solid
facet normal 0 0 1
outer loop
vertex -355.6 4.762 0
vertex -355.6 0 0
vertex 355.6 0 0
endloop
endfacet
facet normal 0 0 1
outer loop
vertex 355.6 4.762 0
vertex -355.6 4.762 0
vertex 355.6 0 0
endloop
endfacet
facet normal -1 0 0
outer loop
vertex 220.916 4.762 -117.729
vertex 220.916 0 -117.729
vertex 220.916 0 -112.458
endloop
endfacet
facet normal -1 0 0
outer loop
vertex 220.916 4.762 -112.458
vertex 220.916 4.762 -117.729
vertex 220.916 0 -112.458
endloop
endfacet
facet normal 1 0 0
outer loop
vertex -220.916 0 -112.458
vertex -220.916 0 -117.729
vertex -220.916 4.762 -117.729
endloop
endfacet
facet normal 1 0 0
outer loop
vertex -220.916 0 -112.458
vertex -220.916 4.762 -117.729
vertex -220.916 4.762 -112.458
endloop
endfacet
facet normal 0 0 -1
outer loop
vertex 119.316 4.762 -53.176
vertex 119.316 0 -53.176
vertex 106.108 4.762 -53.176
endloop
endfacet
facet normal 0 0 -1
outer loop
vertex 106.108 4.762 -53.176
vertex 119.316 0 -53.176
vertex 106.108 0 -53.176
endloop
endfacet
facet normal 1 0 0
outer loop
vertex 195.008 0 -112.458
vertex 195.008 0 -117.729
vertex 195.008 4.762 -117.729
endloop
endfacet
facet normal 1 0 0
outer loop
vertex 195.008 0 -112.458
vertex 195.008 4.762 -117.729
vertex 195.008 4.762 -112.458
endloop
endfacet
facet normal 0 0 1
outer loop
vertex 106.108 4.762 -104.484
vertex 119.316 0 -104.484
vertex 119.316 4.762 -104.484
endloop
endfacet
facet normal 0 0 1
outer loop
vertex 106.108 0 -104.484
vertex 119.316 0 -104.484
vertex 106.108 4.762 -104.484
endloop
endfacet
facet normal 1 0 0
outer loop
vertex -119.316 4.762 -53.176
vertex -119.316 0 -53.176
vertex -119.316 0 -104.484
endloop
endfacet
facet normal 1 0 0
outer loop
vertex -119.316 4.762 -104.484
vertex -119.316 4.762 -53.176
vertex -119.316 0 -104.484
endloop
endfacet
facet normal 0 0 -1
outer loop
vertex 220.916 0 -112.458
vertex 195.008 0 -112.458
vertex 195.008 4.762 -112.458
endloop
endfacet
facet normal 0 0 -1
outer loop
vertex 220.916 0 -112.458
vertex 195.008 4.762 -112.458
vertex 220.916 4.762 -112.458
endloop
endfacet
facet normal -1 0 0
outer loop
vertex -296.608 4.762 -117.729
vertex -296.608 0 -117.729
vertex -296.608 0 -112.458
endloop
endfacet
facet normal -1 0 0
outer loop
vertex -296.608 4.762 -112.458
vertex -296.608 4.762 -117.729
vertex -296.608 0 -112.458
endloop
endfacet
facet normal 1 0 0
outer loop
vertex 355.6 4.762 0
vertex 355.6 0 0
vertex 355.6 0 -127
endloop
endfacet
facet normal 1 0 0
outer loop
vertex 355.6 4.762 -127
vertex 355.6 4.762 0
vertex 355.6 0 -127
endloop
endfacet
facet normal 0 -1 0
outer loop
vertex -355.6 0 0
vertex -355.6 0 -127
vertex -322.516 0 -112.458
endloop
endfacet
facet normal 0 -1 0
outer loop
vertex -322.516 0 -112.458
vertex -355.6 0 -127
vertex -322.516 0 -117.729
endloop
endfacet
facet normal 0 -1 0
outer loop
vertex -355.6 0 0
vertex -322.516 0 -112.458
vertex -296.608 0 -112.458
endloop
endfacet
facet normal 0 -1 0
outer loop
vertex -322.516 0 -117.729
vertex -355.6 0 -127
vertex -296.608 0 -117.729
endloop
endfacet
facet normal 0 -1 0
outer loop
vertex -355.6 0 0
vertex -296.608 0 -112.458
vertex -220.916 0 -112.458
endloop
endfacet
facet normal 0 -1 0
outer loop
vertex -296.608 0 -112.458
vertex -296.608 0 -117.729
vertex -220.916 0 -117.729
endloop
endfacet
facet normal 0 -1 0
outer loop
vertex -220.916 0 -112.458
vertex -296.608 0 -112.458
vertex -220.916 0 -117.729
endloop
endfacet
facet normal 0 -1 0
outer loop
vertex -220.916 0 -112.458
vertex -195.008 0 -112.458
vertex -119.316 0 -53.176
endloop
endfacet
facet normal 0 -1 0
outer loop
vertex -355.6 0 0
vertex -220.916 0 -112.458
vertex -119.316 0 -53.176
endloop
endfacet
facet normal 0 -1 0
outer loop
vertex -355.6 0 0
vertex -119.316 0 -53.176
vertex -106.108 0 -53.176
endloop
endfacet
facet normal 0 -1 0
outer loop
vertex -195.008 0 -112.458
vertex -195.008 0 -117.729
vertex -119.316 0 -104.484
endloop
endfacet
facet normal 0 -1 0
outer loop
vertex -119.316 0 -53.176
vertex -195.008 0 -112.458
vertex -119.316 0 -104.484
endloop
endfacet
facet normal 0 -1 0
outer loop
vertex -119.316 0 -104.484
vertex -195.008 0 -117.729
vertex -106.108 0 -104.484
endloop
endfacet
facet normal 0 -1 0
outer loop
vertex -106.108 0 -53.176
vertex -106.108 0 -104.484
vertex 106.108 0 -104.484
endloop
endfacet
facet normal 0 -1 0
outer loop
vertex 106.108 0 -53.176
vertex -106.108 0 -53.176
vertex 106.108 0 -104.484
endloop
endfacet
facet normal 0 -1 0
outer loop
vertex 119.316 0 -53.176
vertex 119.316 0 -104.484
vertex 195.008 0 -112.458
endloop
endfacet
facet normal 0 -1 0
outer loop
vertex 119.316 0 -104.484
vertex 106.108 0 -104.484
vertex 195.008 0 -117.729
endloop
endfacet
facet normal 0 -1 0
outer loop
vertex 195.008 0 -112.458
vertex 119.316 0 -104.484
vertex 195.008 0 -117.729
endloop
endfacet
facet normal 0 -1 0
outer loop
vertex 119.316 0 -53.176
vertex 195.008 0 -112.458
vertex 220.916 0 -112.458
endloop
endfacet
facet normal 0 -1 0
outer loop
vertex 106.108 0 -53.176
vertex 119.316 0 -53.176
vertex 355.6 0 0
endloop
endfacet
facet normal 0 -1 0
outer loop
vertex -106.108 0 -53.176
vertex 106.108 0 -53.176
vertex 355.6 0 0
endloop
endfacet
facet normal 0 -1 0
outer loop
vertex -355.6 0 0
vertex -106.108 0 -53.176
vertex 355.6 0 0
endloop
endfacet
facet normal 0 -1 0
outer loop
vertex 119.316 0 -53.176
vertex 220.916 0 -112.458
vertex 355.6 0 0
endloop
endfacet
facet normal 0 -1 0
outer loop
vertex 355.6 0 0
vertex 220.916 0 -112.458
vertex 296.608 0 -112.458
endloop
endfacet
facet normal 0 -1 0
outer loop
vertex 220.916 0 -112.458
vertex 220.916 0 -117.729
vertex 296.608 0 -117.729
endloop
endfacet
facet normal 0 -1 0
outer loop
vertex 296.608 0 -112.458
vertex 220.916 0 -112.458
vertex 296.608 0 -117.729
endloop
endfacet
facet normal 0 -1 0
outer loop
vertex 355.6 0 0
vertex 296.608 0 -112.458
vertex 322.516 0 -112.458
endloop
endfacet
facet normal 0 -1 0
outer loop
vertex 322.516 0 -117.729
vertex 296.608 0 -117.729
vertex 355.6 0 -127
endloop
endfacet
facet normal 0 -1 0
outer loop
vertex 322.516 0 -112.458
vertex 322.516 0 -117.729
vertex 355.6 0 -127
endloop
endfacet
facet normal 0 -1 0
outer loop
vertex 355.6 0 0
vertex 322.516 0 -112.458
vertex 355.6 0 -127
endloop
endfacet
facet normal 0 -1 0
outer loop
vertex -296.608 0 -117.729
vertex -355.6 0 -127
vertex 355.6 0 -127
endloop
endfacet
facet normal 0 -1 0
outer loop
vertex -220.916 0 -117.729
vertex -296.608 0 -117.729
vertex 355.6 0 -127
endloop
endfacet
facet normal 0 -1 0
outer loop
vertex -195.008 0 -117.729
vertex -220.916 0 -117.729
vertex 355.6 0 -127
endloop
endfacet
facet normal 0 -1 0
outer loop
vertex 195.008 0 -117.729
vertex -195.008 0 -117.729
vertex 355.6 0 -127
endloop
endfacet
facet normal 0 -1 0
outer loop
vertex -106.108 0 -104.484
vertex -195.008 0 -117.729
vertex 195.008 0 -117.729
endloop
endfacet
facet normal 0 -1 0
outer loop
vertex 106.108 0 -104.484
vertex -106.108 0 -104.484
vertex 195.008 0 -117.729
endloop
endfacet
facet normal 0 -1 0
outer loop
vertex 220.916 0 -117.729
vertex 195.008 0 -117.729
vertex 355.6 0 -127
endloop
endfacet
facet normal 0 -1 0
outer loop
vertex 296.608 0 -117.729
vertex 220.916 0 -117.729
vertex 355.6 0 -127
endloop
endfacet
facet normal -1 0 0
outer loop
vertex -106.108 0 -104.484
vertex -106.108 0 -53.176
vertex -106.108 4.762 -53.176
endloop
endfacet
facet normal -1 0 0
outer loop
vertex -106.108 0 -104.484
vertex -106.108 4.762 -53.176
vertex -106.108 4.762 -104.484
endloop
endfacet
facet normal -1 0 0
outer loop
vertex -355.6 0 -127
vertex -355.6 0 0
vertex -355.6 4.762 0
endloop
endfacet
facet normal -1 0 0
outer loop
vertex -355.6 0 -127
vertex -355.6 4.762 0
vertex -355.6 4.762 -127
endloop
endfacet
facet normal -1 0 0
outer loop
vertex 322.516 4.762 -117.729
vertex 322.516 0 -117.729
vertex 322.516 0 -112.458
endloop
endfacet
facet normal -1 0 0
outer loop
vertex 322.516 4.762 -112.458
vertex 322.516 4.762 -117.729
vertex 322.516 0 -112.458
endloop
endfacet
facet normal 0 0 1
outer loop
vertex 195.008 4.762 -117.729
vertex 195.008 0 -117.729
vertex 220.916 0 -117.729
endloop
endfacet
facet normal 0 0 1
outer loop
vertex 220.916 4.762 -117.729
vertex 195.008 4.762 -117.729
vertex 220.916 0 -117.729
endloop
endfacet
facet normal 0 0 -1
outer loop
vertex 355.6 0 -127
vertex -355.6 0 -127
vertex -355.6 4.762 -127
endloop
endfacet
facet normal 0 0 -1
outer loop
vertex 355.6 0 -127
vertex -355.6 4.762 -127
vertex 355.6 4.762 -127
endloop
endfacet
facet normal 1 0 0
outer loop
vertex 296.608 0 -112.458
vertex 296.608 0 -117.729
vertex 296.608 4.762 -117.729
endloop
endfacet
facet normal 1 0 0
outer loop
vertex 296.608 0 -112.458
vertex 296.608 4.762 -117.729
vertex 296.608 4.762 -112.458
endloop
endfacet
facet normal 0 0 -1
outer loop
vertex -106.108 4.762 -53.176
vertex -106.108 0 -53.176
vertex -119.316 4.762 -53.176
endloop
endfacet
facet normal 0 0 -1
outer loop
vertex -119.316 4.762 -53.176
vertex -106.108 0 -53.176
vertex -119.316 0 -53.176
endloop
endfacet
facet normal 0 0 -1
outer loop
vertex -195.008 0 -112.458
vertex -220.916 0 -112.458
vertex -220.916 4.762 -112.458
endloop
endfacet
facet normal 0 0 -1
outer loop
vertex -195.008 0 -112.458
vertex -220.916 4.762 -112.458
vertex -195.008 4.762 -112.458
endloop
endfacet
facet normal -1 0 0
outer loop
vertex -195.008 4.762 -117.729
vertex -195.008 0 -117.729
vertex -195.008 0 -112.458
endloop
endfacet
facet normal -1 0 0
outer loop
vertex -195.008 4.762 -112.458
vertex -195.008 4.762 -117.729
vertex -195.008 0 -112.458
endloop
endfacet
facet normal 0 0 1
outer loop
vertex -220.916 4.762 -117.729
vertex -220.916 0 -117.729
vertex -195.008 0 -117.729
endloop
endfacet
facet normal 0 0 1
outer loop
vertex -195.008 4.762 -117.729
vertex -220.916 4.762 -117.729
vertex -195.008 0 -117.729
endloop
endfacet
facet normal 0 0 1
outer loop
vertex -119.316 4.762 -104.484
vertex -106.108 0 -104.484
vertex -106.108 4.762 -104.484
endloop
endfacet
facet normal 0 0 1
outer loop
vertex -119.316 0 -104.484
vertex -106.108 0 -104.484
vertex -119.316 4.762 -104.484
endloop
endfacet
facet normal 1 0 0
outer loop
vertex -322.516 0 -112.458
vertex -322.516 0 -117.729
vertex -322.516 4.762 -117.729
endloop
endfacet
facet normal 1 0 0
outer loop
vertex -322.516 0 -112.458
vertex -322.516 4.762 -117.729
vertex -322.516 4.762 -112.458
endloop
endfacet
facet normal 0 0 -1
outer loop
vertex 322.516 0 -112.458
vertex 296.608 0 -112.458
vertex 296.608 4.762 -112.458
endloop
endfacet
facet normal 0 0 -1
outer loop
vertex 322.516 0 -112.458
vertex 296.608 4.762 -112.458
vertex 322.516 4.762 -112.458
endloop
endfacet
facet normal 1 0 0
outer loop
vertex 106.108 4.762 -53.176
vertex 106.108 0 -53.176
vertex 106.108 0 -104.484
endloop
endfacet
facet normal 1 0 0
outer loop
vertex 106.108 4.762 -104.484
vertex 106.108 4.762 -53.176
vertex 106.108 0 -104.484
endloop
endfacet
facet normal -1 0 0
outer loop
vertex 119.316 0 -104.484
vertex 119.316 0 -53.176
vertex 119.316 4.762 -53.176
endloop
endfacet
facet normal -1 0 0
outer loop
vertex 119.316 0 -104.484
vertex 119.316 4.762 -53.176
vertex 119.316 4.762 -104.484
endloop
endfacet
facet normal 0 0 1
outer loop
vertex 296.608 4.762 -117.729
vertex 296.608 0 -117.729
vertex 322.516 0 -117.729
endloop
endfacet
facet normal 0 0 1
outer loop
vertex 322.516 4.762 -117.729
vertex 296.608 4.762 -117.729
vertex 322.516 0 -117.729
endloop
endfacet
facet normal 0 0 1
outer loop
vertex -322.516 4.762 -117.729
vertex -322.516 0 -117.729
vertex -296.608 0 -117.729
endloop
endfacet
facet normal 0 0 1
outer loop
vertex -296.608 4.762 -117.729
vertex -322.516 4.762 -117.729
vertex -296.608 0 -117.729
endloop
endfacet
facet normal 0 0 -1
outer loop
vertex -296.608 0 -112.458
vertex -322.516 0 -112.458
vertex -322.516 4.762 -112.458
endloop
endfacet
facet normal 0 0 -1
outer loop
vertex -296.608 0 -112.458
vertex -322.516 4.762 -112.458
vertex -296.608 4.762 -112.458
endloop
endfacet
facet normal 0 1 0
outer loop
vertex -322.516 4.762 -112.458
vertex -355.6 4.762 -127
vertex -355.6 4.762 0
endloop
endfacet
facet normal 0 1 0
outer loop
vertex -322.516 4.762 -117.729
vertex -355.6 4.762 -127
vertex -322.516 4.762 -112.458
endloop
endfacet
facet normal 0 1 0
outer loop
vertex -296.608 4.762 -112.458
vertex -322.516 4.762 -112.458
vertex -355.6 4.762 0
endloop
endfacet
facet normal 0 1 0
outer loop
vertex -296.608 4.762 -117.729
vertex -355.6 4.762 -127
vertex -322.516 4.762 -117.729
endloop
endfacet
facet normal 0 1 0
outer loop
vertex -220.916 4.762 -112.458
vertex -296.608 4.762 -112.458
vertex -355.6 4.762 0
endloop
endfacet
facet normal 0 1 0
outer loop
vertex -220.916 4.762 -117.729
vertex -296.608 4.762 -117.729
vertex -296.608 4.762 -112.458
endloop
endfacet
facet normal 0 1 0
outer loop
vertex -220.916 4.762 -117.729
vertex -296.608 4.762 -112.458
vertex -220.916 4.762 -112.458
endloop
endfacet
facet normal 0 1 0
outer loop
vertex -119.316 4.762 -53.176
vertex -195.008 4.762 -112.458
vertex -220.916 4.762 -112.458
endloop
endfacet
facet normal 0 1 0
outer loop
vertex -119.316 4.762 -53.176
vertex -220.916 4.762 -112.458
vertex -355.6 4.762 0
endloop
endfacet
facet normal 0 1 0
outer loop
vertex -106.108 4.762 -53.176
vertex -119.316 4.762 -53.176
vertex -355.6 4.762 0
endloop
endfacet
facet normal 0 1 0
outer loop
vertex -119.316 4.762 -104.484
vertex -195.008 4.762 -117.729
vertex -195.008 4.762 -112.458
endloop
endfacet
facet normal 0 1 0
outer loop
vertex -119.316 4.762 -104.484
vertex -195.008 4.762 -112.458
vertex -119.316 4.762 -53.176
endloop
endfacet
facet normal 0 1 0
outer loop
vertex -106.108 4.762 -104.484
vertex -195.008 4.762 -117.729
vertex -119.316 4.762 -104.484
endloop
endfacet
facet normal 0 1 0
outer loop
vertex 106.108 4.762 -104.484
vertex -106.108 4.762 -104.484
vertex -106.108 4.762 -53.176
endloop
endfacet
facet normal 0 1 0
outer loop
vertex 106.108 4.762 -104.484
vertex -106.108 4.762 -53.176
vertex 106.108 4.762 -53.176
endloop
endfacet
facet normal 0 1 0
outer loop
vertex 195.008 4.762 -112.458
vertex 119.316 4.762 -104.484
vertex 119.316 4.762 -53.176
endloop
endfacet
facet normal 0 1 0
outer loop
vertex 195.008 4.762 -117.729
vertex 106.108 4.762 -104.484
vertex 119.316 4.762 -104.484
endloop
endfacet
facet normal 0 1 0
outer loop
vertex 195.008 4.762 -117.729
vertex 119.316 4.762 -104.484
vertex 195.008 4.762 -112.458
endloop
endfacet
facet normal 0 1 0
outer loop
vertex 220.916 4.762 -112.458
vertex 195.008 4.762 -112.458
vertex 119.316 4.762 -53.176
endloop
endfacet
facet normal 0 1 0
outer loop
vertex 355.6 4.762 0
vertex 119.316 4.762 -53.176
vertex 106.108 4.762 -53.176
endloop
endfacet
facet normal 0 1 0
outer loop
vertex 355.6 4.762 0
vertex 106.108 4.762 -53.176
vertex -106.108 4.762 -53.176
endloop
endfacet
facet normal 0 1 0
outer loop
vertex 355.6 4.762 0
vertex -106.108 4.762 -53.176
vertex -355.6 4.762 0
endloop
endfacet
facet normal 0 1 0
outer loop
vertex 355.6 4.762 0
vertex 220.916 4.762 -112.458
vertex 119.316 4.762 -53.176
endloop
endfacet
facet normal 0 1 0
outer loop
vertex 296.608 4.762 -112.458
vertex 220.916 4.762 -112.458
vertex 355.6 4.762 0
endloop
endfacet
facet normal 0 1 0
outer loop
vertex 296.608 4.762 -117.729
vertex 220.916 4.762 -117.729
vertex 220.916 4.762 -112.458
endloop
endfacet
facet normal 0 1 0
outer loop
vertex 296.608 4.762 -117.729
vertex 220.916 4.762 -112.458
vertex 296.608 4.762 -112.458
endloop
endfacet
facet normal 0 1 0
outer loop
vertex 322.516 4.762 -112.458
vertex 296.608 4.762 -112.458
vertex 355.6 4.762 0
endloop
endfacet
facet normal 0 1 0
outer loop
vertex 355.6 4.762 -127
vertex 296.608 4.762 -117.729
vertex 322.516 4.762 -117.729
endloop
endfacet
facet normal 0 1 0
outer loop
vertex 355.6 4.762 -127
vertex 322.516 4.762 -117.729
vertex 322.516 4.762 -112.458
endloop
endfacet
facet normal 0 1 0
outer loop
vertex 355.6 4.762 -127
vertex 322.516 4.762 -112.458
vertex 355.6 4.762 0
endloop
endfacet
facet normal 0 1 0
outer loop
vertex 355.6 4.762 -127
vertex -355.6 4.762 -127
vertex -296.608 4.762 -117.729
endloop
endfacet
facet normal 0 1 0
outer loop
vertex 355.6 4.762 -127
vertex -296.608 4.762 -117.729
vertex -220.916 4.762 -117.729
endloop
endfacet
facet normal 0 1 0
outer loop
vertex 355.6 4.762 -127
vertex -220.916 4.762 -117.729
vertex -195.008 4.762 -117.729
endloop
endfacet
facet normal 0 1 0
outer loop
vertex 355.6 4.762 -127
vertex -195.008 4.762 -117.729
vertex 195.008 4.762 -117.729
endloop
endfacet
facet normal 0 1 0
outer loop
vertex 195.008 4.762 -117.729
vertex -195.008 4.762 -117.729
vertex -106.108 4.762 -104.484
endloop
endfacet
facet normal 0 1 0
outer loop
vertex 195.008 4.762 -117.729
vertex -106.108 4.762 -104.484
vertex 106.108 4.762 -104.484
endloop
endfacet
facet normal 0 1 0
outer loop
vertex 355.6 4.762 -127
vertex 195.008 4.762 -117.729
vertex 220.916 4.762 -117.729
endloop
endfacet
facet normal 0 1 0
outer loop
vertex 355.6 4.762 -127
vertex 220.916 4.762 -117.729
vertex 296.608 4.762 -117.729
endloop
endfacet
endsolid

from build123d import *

# Parameters (mm, degrees)
SKETCH1_W           = 711.2
SKETCH1_H           = 127
BOSS_EXTRUDE1_DEPTH = 4.7625
SKETCH2_W           = 13.208
SKETCH2_H           = 51.308
CUT_EXTRUDE1_DEPTH  = 5.7625
SKETCH3_W           = 25.908
SKETCH3_H           = 5.2705
CUT_EXTRUDE2_DEPTH  = 5.7625


with BuildPart() as part:
    # Sketch1 → Boss-Extrude1 (new body)
    with BuildSketch(Plane(origin=(0, 0, 0), x_dir=(1, 0, 0), z_dir=(0, 1, 0))):
        with Locations((0, 63.5)):
            Rectangle(SKETCH1_W, SKETCH1_H)
    extrude(amount=BOSS_EXTRUDE1_DEPTH)

    # Sketch2 → Cut-Extrude1 (cut, through all)
    with BuildSketch(Plane(origin=(0, 0, 0), x_dir=(-1, 0, 0), z_dir=(0, -1, 0))):
        with Locations((-112.7125, 78.82990203)):
            Rectangle(SKETCH2_W, SKETCH2_H)
        with Locations((112.7125, 78.82990203)):
            Rectangle(SKETCH2_W, SKETCH2_H)
    extrude(amount=-CUT_EXTRUDE1_DEPTH, mode=Mode.SUBTRACT)

    # Sketch3 → Cut-Extrude2 (cut, through all)
    with BuildSketch(Plane.XZ):
        with Locations((-309.5625, -115.09375)):
            Rectangle(SKETCH3_W, SKETCH3_H)
        with Locations((-207.9625, -115.09375)):
            Rectangle(SKETCH3_W, SKETCH3_H)
        with Locations((207.9625, -115.09375)):
            Rectangle(SKETCH3_W, SKETCH3_H)
        with Locations((309.5625, -115.09375)):
            Rectangle(SKETCH3_W, SKETCH3_H)
    extrude(amount=-CUT_EXTRUDE2_DEPTH, mode=Mode.SUBTRACT)


solid = part.part
